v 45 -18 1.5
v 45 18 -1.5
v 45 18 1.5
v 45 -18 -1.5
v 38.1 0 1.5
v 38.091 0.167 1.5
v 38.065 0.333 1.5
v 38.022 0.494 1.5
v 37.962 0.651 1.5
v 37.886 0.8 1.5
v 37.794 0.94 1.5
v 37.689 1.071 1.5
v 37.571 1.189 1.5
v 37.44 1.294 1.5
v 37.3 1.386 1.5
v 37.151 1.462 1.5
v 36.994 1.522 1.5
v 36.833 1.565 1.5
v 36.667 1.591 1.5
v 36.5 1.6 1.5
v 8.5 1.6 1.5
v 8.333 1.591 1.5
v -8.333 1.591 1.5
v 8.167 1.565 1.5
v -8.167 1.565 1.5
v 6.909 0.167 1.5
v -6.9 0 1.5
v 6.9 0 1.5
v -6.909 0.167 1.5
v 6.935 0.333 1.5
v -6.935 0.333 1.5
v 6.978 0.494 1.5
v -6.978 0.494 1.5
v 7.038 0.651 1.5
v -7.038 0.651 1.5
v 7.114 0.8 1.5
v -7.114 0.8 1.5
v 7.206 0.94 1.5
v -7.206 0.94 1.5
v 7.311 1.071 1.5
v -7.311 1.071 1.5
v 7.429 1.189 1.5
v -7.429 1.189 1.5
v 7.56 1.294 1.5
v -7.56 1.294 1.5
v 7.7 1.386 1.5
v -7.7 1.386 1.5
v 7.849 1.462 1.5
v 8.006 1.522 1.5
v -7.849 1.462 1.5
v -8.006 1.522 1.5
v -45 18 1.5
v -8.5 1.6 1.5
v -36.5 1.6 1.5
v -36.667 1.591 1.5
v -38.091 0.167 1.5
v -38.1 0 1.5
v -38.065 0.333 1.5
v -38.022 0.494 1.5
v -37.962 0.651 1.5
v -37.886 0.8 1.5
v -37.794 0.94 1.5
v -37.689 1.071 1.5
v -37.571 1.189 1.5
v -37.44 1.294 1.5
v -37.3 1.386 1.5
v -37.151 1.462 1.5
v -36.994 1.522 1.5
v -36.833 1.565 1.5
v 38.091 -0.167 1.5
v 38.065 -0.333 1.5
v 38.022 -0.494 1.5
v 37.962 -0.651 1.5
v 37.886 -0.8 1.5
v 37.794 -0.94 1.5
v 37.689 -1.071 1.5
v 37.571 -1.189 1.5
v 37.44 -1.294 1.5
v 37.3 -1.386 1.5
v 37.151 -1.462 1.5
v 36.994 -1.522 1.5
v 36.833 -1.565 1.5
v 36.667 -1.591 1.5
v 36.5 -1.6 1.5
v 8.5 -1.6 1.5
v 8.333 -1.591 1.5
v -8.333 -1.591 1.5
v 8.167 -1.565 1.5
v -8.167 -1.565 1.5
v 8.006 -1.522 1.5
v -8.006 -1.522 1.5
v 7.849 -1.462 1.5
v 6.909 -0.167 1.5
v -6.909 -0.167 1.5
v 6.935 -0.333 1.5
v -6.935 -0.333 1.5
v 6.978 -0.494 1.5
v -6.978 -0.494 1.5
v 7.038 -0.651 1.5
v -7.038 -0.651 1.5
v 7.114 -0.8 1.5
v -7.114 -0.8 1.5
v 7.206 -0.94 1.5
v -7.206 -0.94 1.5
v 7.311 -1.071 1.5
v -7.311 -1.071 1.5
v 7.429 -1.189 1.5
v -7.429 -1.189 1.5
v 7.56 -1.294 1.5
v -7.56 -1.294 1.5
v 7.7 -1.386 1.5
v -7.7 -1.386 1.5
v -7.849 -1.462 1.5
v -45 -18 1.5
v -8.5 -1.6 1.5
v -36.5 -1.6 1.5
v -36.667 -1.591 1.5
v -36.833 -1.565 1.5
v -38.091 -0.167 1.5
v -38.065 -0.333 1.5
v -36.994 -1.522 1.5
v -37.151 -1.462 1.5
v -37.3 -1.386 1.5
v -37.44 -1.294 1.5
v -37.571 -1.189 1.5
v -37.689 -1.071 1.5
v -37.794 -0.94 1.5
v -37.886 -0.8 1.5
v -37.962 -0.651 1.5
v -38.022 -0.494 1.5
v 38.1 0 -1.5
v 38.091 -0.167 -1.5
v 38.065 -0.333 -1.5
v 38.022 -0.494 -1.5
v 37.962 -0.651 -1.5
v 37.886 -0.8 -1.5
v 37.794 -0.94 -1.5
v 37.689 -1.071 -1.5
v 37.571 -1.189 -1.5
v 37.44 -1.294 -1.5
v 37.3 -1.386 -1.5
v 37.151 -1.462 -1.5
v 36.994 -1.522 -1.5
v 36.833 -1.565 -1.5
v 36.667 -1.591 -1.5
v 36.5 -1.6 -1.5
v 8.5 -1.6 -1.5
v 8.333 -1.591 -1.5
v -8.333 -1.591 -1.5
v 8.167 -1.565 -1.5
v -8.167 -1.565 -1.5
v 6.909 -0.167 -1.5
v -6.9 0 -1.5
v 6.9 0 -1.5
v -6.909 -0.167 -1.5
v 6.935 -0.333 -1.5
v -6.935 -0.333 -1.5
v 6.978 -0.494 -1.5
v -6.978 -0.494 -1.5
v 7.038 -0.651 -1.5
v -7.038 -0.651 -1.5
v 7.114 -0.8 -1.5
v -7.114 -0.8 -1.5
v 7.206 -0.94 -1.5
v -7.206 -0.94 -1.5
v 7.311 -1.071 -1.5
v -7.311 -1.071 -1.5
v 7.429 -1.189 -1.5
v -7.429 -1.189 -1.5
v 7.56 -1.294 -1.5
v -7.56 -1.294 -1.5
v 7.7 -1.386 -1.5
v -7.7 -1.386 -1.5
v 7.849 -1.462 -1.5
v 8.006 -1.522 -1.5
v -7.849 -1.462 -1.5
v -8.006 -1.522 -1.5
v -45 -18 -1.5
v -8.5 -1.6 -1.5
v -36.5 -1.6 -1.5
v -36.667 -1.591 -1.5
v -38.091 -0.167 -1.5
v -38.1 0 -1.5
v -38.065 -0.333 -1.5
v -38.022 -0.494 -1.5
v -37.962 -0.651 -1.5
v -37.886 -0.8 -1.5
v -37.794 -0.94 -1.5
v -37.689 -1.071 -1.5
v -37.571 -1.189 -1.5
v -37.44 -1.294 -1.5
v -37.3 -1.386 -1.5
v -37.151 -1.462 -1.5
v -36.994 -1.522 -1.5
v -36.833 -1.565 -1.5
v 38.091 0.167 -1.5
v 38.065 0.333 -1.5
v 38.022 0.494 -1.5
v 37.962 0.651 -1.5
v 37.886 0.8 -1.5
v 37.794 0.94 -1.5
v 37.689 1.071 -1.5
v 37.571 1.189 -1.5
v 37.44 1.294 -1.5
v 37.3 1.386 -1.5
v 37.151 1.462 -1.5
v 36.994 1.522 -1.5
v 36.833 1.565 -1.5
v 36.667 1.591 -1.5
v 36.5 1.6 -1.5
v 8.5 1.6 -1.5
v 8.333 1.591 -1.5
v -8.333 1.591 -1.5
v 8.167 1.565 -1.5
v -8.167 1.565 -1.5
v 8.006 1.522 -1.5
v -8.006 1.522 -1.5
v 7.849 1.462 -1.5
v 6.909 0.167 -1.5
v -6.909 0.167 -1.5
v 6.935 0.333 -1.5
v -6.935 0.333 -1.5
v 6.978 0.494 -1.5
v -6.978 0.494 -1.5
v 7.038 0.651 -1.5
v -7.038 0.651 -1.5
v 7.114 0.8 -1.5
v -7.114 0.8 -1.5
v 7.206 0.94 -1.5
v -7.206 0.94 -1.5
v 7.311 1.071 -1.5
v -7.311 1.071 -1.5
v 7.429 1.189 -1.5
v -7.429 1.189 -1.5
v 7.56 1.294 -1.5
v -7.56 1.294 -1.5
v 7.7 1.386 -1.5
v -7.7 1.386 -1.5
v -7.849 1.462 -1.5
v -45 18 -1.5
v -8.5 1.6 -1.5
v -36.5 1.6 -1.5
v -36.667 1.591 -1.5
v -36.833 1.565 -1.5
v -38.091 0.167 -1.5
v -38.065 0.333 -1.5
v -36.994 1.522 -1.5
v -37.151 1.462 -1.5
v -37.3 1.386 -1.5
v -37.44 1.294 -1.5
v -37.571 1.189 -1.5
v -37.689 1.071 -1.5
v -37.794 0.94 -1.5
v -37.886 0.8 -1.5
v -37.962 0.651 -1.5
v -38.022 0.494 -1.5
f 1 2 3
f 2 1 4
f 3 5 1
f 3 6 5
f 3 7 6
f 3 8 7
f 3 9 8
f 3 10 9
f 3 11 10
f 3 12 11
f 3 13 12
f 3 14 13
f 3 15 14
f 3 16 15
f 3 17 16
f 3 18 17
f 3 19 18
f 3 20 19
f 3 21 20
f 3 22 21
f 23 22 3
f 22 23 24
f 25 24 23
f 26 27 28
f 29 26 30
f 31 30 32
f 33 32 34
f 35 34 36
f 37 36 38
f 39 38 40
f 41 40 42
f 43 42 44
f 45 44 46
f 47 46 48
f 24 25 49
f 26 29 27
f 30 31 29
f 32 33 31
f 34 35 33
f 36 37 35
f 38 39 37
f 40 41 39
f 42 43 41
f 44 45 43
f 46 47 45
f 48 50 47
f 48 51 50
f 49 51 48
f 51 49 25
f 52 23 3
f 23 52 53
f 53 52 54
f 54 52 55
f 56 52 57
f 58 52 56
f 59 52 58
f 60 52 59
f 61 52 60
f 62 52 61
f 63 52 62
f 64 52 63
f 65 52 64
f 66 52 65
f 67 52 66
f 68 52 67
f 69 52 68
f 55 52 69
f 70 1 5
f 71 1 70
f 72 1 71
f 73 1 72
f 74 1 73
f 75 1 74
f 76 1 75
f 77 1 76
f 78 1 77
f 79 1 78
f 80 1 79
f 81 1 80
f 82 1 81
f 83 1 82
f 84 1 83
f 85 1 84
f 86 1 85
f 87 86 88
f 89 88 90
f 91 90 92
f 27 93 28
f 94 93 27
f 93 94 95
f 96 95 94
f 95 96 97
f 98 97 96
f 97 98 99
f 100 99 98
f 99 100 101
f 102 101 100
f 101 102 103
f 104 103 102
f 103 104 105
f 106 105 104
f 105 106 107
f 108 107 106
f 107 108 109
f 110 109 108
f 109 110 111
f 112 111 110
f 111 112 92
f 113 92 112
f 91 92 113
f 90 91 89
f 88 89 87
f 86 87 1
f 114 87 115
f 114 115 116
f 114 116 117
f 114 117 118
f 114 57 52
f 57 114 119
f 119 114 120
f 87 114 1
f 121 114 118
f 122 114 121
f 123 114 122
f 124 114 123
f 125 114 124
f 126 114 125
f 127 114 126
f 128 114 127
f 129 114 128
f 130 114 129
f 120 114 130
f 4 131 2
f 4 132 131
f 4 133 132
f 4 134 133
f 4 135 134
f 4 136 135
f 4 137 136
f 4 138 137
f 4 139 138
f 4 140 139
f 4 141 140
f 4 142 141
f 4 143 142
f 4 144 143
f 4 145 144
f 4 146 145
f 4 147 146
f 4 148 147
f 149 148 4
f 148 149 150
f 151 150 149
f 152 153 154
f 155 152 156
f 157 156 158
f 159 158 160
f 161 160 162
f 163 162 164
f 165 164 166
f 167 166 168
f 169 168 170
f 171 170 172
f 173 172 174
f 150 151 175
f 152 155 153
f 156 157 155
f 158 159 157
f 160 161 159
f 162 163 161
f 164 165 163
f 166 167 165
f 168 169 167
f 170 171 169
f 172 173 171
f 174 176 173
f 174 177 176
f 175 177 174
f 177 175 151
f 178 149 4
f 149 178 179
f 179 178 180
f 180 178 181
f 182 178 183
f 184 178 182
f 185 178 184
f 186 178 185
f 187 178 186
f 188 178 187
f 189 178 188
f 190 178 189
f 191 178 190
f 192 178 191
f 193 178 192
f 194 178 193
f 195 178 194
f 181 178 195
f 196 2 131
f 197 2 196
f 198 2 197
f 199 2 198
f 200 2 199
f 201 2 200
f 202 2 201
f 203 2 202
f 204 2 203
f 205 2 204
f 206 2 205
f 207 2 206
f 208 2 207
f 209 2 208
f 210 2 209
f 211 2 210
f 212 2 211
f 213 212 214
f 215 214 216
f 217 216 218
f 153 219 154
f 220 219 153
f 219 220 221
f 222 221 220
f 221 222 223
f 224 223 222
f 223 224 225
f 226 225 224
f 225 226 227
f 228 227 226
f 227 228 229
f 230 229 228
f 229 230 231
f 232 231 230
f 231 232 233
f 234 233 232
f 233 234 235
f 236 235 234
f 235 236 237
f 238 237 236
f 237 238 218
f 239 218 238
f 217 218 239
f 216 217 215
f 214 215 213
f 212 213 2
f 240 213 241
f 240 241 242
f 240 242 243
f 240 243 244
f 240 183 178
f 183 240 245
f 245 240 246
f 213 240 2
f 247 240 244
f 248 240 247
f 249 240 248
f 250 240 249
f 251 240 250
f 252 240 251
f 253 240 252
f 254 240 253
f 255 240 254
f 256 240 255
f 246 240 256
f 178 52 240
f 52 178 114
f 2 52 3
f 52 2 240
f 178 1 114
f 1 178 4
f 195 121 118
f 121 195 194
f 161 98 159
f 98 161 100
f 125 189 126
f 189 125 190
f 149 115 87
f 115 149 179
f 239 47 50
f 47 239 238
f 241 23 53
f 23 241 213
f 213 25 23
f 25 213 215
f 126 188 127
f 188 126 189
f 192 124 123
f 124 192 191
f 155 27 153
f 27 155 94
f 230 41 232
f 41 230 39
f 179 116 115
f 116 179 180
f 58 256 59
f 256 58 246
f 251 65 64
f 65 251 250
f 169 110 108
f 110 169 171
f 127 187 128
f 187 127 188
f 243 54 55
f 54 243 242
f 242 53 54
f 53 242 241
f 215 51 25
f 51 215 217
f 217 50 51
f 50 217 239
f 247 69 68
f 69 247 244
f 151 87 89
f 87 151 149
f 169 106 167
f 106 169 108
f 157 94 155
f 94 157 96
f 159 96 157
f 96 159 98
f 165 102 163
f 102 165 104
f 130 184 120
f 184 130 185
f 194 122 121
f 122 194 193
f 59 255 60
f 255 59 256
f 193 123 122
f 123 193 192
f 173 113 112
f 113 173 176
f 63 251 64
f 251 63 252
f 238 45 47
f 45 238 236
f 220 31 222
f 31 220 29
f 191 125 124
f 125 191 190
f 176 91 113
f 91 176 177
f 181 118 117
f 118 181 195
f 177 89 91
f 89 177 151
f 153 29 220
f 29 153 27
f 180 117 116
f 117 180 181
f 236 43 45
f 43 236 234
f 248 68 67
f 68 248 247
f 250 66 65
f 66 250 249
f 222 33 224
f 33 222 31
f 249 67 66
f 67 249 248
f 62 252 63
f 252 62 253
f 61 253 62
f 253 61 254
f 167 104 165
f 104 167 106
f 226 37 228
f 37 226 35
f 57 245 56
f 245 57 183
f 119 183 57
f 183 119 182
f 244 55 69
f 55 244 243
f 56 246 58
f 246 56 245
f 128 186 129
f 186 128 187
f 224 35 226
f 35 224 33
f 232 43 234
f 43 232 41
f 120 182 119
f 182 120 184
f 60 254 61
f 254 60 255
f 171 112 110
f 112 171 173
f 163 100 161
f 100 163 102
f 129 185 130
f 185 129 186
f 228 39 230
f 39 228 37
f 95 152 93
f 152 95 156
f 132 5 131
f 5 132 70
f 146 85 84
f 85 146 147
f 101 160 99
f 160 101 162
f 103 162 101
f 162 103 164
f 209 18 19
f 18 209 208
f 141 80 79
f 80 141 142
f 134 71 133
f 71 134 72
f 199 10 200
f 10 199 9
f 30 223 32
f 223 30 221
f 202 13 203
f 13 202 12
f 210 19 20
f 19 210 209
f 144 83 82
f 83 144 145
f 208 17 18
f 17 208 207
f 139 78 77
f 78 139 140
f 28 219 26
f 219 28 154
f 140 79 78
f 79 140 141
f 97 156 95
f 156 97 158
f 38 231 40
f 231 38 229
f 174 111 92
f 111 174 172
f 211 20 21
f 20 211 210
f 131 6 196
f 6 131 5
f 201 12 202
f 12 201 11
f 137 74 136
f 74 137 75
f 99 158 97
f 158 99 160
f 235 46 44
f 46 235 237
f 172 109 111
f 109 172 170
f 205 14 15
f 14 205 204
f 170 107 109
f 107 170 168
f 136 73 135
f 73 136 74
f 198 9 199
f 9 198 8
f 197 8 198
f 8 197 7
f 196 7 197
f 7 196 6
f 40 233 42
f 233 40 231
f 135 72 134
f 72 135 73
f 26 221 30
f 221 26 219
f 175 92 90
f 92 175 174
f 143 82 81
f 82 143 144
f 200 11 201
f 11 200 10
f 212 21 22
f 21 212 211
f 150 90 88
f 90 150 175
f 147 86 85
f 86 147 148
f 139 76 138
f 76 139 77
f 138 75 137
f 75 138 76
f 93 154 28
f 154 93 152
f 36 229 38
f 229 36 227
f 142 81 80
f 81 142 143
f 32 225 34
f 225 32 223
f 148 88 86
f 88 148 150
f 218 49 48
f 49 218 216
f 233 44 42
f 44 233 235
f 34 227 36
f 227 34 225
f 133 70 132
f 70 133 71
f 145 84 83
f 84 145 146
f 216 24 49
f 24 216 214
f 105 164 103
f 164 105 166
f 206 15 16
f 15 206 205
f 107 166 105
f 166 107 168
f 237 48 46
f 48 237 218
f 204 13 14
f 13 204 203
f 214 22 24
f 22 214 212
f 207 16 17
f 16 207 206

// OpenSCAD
// Limit-switch mounting plate.
$fn = 60;
eps = 0.02;
plate_l = 90;
plate_w = 36;
plate_t = 3;
slot_l = 28;
module slot(x) { hull() { translate([x-slot_l/2,0,-plate_t/2-eps]) cylinder(d=3.2,h=plate_t+2*eps); translate([x+slot_l/2,0,-plate_t/2-eps]) cylinder(d=3.2,h=plate_t+2*eps); } }
difference() { cube([plate_l,plate_w,plate_t],center=true); slot(-plate_l/4); slot(plate_l/4); }
